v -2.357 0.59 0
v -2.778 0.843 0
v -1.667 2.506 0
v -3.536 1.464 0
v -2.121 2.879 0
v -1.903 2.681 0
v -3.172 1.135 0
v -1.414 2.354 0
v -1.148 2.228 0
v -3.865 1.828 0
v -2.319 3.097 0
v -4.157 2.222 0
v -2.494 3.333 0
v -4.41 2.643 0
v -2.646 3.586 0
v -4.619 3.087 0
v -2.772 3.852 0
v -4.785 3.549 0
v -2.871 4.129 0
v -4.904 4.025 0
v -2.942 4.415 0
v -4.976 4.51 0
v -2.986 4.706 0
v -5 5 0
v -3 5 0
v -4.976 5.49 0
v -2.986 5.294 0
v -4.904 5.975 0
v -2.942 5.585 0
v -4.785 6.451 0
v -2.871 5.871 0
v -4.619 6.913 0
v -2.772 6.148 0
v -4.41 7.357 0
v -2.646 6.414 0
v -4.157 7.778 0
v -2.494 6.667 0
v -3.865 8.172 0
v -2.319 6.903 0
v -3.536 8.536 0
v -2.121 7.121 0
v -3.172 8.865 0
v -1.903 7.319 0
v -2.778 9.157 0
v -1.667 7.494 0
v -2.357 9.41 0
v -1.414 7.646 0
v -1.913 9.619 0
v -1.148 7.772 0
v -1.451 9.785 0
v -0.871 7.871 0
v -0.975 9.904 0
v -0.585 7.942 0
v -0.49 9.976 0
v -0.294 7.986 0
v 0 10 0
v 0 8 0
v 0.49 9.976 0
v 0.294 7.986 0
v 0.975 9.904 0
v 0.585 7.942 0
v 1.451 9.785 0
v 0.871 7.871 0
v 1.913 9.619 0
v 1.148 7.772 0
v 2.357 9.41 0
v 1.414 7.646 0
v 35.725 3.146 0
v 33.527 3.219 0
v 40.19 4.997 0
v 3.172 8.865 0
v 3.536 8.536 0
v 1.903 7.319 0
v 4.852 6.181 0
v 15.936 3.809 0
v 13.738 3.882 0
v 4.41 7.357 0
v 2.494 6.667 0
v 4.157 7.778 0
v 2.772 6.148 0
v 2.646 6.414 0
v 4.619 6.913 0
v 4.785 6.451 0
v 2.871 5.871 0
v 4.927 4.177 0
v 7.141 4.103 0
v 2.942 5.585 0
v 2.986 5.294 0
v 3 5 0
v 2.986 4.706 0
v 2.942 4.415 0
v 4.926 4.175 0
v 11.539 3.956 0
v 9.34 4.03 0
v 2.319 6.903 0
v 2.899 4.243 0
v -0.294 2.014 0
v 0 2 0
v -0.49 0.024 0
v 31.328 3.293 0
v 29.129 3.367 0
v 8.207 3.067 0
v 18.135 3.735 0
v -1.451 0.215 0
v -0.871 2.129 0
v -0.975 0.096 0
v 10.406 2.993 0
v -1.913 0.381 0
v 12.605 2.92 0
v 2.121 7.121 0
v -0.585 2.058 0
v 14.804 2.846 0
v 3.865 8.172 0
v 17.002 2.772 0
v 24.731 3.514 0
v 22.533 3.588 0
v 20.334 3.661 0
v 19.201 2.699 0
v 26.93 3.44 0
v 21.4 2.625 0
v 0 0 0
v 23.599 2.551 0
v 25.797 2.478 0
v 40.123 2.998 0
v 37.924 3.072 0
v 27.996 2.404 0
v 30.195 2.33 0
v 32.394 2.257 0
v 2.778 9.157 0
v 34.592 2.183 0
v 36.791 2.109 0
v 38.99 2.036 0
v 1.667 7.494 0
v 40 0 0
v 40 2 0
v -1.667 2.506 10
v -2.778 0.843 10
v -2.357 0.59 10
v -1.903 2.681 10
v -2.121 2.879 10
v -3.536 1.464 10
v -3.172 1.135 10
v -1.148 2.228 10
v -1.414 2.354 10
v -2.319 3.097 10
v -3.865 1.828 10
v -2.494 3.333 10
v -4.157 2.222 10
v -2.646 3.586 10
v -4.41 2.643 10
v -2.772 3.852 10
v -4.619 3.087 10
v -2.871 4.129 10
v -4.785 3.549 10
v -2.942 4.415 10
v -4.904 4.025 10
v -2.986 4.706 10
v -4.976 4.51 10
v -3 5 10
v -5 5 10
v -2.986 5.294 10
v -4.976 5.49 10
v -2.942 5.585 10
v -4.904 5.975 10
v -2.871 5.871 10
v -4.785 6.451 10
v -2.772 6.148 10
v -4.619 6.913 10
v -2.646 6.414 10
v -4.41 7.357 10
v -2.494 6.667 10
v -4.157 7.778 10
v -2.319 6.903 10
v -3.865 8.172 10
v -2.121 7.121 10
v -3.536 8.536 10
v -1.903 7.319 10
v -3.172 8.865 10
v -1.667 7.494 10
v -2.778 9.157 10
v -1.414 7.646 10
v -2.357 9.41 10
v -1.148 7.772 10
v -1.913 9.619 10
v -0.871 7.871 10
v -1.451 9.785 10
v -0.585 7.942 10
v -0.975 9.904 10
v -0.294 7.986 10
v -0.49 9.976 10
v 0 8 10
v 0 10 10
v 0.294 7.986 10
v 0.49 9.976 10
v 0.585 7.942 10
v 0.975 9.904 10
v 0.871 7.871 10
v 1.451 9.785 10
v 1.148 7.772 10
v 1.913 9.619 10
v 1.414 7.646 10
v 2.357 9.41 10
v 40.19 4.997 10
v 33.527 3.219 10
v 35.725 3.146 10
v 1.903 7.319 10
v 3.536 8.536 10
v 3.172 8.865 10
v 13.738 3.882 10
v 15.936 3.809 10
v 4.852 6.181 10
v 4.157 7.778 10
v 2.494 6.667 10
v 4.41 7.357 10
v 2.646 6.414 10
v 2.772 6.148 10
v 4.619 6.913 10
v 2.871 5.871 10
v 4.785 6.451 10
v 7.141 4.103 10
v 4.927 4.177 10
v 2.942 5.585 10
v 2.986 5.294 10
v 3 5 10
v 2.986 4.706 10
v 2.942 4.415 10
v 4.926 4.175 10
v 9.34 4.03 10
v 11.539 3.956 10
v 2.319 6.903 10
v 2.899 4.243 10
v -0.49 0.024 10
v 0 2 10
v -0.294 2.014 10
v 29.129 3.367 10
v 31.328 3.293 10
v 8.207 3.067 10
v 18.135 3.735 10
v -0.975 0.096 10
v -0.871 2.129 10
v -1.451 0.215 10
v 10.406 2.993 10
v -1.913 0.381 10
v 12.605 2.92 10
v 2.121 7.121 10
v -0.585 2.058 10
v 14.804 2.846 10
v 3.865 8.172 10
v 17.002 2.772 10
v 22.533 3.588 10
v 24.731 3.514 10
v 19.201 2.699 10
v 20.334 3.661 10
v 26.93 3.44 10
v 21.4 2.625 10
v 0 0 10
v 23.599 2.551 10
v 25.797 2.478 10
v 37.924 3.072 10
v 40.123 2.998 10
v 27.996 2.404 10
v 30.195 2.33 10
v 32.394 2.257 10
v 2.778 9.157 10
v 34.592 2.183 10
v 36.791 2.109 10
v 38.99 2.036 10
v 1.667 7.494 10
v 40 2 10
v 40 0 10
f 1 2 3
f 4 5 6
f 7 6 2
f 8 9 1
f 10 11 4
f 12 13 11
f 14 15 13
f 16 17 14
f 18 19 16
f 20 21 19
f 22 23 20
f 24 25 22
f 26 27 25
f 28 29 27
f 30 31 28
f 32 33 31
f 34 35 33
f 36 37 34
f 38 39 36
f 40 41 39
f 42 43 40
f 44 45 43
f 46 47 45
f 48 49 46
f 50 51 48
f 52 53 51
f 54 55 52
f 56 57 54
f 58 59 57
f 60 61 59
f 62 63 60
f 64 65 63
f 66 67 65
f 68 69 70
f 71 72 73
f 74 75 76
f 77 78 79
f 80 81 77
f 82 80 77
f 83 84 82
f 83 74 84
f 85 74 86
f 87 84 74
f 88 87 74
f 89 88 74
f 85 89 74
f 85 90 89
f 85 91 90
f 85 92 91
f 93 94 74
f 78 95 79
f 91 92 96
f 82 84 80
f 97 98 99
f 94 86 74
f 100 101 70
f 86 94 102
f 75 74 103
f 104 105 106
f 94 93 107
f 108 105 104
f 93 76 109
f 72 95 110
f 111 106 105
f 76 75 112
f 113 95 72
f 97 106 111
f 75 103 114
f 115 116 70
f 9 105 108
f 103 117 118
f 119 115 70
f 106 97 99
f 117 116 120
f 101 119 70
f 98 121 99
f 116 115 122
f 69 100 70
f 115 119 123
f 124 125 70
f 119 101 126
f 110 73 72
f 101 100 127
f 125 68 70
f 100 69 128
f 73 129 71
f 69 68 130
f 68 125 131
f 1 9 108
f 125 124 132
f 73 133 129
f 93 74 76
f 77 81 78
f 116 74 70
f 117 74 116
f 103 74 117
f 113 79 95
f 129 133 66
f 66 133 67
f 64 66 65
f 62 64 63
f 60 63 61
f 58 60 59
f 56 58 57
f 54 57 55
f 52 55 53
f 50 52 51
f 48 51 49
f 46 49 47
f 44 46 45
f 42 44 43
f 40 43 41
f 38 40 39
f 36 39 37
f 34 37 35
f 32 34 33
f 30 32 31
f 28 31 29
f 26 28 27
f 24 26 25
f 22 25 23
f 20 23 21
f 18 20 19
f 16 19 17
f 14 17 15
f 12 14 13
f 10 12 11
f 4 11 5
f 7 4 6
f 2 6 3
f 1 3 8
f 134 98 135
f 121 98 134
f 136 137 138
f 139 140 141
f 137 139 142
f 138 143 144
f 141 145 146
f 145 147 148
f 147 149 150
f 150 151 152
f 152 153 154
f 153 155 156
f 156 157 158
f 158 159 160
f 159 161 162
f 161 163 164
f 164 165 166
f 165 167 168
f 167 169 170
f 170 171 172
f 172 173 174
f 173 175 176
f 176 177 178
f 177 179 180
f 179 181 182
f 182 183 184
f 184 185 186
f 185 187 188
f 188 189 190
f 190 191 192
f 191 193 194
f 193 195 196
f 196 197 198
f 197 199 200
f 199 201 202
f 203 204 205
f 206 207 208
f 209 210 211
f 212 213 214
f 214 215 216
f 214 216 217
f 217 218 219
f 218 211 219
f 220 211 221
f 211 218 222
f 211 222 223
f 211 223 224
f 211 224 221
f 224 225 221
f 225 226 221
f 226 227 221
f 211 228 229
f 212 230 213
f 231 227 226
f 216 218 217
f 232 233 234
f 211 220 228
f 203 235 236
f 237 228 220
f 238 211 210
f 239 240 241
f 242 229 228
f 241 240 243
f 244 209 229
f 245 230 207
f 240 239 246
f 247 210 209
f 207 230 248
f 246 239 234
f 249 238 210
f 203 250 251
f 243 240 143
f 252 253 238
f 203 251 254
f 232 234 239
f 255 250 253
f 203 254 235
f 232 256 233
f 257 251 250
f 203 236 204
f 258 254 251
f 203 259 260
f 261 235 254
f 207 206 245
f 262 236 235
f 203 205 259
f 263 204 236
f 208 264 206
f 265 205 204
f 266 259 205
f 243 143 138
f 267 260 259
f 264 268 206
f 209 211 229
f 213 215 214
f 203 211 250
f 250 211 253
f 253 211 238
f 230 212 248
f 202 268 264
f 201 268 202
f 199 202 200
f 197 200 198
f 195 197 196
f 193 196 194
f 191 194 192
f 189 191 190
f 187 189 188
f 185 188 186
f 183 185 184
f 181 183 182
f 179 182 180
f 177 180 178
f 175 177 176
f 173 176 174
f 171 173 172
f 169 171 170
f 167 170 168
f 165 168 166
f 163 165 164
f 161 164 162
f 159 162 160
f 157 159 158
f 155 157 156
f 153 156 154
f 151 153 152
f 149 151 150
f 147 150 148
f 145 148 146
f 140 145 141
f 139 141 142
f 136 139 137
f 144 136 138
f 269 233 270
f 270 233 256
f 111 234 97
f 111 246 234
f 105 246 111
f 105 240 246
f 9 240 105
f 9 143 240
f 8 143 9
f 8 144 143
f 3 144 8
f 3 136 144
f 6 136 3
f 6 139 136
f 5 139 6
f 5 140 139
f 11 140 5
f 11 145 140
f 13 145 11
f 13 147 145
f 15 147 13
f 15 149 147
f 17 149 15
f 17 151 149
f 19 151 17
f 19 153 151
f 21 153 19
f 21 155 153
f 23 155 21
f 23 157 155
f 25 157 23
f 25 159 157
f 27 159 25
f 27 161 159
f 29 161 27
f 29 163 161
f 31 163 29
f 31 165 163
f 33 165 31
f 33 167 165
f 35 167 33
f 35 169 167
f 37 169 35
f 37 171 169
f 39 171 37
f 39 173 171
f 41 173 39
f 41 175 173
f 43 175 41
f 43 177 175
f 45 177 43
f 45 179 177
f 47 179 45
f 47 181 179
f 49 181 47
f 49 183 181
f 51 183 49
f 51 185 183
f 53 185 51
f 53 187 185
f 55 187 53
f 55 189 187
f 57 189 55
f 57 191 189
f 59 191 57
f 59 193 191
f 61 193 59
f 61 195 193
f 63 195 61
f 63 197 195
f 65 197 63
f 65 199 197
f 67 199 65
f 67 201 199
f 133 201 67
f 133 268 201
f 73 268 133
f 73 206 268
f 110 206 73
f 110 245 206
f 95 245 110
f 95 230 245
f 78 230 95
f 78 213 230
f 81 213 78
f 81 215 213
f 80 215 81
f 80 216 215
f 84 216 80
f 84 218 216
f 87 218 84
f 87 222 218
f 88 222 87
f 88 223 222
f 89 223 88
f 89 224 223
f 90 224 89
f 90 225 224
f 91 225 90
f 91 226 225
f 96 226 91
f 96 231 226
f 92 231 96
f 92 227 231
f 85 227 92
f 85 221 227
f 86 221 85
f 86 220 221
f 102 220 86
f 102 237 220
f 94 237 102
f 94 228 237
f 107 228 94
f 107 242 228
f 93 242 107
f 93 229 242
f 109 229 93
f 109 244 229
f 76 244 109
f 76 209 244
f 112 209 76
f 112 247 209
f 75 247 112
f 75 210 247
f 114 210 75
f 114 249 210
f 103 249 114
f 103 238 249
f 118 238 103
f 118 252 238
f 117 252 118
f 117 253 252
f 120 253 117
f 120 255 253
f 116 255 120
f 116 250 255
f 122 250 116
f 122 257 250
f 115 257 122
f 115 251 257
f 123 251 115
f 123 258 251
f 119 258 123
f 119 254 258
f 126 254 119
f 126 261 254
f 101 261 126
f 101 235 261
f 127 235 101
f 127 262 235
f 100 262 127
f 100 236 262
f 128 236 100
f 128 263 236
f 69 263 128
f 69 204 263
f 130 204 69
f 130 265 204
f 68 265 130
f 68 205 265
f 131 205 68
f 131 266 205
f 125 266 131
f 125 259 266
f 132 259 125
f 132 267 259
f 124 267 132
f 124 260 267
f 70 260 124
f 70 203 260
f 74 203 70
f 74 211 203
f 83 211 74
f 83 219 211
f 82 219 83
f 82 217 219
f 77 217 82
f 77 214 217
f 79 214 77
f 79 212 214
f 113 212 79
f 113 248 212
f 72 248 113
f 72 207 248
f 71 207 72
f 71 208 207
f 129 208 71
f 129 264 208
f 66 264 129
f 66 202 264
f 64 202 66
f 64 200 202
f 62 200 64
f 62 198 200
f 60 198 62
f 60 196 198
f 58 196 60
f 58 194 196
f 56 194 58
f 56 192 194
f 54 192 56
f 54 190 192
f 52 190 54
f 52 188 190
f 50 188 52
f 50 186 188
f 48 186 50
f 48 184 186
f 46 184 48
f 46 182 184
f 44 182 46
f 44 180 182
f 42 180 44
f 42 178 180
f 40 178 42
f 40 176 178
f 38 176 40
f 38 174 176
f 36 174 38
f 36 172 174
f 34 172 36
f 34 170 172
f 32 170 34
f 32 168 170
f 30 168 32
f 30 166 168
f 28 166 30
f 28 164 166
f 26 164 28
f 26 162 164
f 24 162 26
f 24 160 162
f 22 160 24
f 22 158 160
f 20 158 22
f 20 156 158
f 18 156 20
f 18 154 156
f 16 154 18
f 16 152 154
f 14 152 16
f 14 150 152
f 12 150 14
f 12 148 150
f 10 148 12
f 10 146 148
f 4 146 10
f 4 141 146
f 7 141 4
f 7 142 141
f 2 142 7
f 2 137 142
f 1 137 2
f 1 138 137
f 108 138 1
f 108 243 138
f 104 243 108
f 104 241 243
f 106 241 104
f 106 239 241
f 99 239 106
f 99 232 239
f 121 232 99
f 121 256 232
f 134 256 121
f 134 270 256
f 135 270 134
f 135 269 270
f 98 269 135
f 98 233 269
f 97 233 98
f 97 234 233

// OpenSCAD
fn = 64;
// Radius of the loop part of the pin
pin_radius = 5;
// Pin length
pin_length = 40;
// Pin width
pin_width = 10;
// Thickness of the arms
pin_thickness = 2;
// Gap between the arms. When you put something of this thickness in the pin, the arms should be parallel.
pin_gap = 1.34;

// Tooth width
tooth_width = 2.2;
// Tooth height
tooth_height = 1;
// Which side to put the teeth on. Set to false to put teeth on flat side.
teeth_on_spring_side = true;

linear_extrude(pin_width) pin_section();

module pin_section() {
  difference() {
    translate([0, pin_radius], 0) {
      difference() {
        circle(pin_radius, $fn=fn);
        circle(pin_radius - pin_thickness, $fn=fn);
      }
    }
    translate([0, pin_thickness]) polygon([
      [0, 0],
      [0, pin_gap + tooth_height],
      [(pin_gap+tooth_height)/pin_gap*pin_length, 0]
    ]);
  }

  square([pin_length, pin_thickness]);
  if (!teeth_on_spring_side) {
    translate([0, pin_thickness]) teeth();
  }

  difference() {
    rotate([0, 0, atan(pin_gap/pin_length)*-1])
    translate([0, pin_gap + tooth_height + pin_thickness]) {
      square([pin_length, pin_thickness]);
      if (teeth_on_spring_side) mirror([0, 1, 0]) teeth();
    }
    
    translate([0, pin_radius], 0) circle(pin_radius - pin_thickness, $fn=fn);
  }
}

module teeth() {
  translate([(pin_length-pin_radius)%tooth_width, 0])
  for (i = [pin_radius : tooth_width : pin_length-tooth_width]) {
    polygon([[i, 0], [i + tooth_width/2, tooth_height], [i + tooth_width, 0]]);
  }
}
